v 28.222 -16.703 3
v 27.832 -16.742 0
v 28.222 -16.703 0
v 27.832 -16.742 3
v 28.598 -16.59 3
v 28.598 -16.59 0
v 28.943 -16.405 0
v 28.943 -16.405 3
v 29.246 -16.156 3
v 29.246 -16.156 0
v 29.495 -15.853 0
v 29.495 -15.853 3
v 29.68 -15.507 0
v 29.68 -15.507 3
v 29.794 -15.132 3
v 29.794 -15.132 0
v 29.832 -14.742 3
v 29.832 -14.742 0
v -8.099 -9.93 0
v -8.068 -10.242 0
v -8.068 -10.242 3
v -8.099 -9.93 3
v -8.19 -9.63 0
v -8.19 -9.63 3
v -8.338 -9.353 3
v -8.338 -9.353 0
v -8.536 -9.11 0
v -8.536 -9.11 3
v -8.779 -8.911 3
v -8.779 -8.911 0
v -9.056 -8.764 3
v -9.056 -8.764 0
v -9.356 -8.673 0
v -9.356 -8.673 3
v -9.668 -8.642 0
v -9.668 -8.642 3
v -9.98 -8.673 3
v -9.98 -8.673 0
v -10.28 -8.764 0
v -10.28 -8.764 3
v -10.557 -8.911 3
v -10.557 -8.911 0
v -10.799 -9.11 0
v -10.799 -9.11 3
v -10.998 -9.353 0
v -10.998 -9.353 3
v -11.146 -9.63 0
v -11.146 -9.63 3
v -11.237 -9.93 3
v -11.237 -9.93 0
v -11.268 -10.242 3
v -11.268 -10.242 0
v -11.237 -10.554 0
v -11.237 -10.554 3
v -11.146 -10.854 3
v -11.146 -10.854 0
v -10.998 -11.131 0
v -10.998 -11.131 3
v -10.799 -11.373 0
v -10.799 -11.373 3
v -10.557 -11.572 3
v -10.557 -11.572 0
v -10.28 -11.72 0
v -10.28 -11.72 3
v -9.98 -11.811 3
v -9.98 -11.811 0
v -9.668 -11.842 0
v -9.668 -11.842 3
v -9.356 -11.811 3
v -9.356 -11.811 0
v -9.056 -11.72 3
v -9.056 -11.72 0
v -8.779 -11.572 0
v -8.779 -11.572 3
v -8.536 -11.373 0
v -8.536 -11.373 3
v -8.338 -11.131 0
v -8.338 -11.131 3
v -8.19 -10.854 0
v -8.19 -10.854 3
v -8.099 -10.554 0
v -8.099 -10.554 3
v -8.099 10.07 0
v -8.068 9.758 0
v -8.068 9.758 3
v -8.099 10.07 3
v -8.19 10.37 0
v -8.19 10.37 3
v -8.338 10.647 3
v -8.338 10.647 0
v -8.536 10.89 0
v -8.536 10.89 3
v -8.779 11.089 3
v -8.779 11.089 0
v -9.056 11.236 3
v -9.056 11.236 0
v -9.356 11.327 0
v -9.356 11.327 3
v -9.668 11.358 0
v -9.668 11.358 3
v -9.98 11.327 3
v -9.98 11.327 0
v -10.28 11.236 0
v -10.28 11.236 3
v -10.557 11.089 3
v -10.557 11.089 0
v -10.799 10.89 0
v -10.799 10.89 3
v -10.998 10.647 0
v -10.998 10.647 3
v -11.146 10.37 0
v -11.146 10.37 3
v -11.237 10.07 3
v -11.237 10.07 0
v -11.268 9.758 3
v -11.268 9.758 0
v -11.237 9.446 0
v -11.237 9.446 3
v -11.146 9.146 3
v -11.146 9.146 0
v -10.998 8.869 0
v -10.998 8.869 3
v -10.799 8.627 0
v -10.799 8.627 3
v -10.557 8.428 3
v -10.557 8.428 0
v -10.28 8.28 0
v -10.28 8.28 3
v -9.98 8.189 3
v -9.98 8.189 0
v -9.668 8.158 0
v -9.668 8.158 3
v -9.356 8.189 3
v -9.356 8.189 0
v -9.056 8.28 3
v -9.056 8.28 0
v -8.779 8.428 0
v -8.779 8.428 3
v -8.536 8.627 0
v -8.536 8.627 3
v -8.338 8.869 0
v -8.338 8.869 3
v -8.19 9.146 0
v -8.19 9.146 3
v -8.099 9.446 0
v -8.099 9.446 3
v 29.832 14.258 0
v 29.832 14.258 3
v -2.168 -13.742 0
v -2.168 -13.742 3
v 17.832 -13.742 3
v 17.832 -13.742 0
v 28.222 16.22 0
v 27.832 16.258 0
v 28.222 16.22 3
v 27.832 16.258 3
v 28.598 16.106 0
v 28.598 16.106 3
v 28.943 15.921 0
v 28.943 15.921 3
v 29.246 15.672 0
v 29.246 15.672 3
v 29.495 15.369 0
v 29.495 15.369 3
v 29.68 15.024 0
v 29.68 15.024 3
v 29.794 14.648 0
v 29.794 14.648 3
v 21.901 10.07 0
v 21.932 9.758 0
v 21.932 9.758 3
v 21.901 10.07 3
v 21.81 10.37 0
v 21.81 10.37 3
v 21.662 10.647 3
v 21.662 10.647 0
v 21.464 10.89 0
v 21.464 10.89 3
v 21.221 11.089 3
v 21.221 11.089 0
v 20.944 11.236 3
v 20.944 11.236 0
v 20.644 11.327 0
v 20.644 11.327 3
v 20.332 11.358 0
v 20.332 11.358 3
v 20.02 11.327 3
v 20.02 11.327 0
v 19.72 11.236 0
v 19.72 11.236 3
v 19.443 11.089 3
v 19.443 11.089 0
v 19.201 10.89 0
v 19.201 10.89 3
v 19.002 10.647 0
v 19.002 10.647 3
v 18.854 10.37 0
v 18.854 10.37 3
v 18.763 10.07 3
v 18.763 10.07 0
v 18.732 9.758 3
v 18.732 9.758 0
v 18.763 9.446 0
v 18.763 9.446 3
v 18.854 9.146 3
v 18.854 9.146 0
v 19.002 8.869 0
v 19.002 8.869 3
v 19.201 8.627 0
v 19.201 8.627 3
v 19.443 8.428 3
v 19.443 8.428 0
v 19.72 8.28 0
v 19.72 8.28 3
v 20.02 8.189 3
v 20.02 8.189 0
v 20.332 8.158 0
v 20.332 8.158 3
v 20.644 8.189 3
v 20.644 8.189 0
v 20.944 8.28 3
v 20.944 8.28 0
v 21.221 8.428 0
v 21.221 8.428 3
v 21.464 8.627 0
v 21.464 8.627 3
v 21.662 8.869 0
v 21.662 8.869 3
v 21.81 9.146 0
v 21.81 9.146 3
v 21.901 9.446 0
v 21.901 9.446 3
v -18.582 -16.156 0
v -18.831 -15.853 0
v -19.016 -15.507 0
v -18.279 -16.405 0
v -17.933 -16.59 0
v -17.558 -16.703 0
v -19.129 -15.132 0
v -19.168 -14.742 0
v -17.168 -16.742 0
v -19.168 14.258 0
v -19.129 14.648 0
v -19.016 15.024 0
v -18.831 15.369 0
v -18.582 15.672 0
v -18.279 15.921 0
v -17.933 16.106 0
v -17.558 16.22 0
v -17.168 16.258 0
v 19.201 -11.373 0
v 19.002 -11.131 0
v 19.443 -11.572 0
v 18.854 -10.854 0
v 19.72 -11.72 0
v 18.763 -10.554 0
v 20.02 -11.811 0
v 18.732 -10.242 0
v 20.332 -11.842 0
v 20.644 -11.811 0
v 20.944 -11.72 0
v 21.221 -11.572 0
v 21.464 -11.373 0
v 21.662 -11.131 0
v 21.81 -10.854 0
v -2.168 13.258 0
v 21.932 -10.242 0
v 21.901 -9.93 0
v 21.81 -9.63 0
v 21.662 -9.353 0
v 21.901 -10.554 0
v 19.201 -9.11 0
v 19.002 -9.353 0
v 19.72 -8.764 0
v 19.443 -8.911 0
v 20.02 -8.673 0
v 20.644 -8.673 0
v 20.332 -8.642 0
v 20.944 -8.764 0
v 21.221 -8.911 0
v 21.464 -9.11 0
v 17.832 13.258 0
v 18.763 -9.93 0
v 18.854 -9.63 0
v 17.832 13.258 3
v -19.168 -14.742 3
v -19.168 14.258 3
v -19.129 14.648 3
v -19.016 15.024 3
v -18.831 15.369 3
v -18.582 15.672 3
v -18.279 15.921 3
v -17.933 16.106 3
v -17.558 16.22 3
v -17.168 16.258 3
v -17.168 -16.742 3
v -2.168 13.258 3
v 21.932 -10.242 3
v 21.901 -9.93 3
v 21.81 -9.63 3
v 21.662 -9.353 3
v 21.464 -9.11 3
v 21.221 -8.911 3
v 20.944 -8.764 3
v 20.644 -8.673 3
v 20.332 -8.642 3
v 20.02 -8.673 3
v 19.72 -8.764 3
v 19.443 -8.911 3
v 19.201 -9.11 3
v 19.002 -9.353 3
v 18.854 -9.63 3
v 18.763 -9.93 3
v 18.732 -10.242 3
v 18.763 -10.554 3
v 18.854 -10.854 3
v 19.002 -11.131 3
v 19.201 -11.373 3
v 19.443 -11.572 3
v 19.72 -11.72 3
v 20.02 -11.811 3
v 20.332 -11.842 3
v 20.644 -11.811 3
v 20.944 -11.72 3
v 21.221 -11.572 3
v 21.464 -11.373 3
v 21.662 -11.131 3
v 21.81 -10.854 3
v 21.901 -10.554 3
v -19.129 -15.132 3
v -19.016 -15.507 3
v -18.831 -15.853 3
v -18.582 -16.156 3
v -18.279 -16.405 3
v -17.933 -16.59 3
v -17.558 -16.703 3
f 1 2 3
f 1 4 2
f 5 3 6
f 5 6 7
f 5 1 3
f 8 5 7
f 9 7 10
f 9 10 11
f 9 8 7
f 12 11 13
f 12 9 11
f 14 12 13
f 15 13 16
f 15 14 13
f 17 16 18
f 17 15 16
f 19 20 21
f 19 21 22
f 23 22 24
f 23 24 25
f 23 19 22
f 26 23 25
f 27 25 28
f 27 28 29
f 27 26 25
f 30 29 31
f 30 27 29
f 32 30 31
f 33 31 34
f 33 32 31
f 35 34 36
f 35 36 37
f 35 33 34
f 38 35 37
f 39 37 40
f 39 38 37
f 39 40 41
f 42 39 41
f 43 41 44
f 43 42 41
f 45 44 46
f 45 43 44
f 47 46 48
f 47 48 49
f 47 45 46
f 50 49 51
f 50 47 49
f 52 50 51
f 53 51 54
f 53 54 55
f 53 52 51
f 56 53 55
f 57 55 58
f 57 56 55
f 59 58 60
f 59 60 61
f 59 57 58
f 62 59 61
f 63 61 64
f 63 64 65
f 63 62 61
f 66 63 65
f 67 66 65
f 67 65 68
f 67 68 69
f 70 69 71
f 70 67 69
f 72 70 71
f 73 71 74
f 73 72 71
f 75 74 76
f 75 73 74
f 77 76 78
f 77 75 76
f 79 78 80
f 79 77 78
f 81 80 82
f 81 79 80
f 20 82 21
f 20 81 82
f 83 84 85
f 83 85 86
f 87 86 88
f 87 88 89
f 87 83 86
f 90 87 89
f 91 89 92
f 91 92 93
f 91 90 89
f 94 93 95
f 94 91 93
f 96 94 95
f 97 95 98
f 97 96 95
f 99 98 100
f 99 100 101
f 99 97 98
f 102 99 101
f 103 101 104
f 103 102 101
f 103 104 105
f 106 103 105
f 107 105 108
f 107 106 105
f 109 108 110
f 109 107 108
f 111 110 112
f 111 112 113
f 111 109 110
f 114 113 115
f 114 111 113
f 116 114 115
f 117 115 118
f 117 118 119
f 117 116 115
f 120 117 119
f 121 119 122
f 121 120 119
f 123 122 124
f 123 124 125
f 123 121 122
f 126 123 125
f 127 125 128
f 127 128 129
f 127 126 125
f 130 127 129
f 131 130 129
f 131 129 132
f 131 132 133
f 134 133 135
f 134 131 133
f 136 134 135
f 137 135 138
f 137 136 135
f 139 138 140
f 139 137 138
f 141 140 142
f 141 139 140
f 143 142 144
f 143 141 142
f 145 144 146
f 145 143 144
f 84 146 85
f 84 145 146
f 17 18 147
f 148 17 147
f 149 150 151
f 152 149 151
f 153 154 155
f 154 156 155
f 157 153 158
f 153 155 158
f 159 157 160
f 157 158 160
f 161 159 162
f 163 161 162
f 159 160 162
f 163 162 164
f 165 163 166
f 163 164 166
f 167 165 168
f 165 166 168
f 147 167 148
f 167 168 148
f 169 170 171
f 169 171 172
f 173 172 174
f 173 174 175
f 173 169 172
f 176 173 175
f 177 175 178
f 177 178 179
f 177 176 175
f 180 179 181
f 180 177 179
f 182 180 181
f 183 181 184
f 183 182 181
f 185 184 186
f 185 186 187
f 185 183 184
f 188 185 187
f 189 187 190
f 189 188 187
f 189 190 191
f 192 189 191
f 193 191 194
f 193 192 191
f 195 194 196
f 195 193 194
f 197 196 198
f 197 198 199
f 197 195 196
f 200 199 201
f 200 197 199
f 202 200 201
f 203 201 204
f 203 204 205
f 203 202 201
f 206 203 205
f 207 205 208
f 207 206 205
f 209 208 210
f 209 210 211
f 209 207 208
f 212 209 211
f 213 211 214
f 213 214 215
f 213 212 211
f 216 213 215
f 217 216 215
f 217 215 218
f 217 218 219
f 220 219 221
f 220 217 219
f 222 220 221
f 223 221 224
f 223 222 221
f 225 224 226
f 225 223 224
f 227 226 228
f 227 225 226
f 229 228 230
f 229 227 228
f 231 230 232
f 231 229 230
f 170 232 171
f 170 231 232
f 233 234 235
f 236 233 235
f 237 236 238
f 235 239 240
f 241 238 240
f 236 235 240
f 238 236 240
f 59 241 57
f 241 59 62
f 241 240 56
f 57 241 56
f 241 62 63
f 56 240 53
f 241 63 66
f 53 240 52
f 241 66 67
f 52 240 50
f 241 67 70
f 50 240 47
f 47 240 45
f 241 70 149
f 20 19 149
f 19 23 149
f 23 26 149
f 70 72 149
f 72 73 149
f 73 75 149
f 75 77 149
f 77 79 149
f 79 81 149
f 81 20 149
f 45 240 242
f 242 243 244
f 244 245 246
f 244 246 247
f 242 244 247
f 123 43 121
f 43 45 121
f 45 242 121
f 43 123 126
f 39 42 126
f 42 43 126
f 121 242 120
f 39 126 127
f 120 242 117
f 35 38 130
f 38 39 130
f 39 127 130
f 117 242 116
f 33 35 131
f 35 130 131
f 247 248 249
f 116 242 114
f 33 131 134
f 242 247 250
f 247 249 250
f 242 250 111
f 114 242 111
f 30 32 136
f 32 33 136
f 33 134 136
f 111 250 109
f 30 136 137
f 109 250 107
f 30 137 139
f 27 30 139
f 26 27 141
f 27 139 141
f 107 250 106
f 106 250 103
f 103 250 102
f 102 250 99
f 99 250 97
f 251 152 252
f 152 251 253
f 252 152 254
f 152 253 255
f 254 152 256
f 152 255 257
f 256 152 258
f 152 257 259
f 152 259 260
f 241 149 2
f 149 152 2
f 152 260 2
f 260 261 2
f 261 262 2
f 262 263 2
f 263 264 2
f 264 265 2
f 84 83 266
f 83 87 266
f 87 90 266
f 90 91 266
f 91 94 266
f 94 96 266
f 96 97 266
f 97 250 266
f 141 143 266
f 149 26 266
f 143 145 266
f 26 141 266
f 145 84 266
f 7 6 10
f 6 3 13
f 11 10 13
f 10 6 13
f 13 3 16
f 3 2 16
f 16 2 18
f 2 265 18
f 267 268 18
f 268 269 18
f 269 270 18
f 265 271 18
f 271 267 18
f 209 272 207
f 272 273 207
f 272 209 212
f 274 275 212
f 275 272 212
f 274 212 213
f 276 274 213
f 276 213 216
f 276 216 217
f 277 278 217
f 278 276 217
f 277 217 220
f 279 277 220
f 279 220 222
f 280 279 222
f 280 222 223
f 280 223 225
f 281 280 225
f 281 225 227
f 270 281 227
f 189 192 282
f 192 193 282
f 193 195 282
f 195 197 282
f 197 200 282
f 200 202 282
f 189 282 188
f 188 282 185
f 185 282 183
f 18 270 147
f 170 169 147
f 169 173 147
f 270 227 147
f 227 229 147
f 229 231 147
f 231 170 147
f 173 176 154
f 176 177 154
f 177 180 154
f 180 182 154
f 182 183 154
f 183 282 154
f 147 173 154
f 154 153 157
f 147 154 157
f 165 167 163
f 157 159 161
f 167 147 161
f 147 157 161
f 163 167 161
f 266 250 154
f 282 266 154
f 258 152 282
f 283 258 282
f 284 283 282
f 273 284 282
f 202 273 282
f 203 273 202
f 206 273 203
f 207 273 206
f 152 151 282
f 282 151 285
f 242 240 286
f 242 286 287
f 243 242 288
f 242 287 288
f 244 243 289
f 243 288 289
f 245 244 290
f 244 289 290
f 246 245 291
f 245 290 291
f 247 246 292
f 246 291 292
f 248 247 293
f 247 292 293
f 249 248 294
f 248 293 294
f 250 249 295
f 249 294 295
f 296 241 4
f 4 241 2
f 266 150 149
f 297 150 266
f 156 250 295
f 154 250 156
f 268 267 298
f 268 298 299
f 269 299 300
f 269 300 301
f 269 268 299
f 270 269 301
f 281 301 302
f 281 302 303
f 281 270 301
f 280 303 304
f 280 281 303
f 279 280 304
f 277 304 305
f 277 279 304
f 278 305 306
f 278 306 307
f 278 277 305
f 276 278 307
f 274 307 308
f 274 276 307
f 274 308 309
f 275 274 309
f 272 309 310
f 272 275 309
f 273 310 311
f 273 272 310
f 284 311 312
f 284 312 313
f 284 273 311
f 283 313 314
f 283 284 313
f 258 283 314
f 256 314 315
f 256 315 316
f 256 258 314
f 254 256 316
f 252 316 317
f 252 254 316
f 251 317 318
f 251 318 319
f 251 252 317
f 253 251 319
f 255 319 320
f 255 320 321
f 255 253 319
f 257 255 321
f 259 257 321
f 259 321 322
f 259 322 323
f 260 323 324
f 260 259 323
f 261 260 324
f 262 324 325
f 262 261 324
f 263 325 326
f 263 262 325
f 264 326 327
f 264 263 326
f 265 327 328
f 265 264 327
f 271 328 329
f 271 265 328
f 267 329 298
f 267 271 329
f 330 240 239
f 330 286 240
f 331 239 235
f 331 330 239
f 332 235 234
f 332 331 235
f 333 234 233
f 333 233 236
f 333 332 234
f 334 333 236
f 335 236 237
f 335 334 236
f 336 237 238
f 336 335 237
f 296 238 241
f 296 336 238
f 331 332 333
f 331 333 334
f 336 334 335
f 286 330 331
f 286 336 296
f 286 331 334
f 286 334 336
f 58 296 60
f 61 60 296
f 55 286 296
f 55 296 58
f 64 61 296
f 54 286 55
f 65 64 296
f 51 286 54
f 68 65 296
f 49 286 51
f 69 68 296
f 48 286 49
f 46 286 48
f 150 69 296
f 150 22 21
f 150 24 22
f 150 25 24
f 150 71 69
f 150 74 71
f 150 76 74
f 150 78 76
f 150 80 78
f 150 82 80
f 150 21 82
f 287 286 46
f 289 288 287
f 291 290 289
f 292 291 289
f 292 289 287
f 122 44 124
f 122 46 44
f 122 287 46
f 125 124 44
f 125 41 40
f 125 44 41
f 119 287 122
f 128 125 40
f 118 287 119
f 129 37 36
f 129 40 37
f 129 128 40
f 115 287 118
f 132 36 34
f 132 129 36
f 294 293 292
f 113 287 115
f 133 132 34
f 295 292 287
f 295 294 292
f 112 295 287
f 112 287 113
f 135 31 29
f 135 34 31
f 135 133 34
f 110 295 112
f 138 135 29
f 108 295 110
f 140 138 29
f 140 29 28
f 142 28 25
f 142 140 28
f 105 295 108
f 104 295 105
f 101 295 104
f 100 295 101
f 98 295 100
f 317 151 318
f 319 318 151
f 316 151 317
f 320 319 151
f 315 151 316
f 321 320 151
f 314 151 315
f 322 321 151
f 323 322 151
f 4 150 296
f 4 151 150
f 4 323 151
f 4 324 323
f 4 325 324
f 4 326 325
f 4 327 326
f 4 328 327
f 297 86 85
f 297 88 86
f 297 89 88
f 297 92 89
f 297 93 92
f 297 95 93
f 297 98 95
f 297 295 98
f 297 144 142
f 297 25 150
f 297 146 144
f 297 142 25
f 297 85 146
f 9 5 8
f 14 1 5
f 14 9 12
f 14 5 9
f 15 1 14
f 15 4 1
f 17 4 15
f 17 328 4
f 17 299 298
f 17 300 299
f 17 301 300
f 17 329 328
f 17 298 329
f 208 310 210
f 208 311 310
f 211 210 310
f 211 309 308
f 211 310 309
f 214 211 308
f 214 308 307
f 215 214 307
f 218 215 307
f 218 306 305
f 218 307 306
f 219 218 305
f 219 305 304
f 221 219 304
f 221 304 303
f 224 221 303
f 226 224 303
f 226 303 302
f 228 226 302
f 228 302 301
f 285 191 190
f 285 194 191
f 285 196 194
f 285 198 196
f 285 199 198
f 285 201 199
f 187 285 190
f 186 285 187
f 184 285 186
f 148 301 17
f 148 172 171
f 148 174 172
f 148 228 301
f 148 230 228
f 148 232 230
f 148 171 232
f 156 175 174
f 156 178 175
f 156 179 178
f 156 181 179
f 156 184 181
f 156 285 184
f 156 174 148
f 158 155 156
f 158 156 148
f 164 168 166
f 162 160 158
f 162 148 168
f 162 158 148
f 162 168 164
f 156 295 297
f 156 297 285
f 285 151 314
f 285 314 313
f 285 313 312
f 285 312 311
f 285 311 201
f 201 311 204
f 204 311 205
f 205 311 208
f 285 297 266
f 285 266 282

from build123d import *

# Parameters (mm, degrees)
SKETCH1_W           = 49
SKETCH1_H           = 33
SKETCH1_R           = 1.6
BOSS_EXTRUDE2_DEPTH = 3
FILLET1_R           = 2
SKETCH2_W           = 20
SKETCH2_H           = 27
CUT_EXTRUDE1_DEPTH  = 10


with BuildPart() as part:
    # Sketch1 → Boss-Extrude2 (new body)
    with BuildSketch(Plane.XY):
        with Locations((5.332147937, -0.241820768)):
            Rectangle(SKETCH1_W, SKETCH1_H)
        with Locations((-9.667852063, 9.758179232)):
            Circle(SKETCH1_R, mode=Mode.SUBTRACT)
        with Locations((20.332147937, 9.758179232)):
            Circle(SKETCH1_R, mode=Mode.SUBTRACT)
        with Locations((-9.667852063, -10.241820768)):
            Circle(SKETCH1_R, mode=Mode.SUBTRACT)
        with Locations((20.332147937, -10.241820768)):
            Circle(SKETCH1_R, mode=Mode.SUBTRACT)
    extrude(amount=BOSS_EXTRUDE2_DEPTH)

    # Fillet1
    fillet1_edges = [part.edges().sort_by_distance(p)[0] for p in [
        (-19.167852063, 16.258179232, 1.5),
        (29.832147937, 16.258179232, 1.5),
        (29.832147937, -16.741820768, 1.5),
        (-19.167852063, -16.741820768, 1.5),
    ]]
    fillet(fillet1_edges, radius=FILLET1_R)

    # Sketch2 → Cut-Extrude1 (cut)
    with BuildSketch(Plane.XY.offset(3)):
        with Locations((7.832147937, -0.241820768)):
            Rectangle(SKETCH2_W, SKETCH2_H)
    extrude(amount=-CUT_EXTRUDE1_DEPTH, mode=Mode.SUBTRACT)


solid = part.part
